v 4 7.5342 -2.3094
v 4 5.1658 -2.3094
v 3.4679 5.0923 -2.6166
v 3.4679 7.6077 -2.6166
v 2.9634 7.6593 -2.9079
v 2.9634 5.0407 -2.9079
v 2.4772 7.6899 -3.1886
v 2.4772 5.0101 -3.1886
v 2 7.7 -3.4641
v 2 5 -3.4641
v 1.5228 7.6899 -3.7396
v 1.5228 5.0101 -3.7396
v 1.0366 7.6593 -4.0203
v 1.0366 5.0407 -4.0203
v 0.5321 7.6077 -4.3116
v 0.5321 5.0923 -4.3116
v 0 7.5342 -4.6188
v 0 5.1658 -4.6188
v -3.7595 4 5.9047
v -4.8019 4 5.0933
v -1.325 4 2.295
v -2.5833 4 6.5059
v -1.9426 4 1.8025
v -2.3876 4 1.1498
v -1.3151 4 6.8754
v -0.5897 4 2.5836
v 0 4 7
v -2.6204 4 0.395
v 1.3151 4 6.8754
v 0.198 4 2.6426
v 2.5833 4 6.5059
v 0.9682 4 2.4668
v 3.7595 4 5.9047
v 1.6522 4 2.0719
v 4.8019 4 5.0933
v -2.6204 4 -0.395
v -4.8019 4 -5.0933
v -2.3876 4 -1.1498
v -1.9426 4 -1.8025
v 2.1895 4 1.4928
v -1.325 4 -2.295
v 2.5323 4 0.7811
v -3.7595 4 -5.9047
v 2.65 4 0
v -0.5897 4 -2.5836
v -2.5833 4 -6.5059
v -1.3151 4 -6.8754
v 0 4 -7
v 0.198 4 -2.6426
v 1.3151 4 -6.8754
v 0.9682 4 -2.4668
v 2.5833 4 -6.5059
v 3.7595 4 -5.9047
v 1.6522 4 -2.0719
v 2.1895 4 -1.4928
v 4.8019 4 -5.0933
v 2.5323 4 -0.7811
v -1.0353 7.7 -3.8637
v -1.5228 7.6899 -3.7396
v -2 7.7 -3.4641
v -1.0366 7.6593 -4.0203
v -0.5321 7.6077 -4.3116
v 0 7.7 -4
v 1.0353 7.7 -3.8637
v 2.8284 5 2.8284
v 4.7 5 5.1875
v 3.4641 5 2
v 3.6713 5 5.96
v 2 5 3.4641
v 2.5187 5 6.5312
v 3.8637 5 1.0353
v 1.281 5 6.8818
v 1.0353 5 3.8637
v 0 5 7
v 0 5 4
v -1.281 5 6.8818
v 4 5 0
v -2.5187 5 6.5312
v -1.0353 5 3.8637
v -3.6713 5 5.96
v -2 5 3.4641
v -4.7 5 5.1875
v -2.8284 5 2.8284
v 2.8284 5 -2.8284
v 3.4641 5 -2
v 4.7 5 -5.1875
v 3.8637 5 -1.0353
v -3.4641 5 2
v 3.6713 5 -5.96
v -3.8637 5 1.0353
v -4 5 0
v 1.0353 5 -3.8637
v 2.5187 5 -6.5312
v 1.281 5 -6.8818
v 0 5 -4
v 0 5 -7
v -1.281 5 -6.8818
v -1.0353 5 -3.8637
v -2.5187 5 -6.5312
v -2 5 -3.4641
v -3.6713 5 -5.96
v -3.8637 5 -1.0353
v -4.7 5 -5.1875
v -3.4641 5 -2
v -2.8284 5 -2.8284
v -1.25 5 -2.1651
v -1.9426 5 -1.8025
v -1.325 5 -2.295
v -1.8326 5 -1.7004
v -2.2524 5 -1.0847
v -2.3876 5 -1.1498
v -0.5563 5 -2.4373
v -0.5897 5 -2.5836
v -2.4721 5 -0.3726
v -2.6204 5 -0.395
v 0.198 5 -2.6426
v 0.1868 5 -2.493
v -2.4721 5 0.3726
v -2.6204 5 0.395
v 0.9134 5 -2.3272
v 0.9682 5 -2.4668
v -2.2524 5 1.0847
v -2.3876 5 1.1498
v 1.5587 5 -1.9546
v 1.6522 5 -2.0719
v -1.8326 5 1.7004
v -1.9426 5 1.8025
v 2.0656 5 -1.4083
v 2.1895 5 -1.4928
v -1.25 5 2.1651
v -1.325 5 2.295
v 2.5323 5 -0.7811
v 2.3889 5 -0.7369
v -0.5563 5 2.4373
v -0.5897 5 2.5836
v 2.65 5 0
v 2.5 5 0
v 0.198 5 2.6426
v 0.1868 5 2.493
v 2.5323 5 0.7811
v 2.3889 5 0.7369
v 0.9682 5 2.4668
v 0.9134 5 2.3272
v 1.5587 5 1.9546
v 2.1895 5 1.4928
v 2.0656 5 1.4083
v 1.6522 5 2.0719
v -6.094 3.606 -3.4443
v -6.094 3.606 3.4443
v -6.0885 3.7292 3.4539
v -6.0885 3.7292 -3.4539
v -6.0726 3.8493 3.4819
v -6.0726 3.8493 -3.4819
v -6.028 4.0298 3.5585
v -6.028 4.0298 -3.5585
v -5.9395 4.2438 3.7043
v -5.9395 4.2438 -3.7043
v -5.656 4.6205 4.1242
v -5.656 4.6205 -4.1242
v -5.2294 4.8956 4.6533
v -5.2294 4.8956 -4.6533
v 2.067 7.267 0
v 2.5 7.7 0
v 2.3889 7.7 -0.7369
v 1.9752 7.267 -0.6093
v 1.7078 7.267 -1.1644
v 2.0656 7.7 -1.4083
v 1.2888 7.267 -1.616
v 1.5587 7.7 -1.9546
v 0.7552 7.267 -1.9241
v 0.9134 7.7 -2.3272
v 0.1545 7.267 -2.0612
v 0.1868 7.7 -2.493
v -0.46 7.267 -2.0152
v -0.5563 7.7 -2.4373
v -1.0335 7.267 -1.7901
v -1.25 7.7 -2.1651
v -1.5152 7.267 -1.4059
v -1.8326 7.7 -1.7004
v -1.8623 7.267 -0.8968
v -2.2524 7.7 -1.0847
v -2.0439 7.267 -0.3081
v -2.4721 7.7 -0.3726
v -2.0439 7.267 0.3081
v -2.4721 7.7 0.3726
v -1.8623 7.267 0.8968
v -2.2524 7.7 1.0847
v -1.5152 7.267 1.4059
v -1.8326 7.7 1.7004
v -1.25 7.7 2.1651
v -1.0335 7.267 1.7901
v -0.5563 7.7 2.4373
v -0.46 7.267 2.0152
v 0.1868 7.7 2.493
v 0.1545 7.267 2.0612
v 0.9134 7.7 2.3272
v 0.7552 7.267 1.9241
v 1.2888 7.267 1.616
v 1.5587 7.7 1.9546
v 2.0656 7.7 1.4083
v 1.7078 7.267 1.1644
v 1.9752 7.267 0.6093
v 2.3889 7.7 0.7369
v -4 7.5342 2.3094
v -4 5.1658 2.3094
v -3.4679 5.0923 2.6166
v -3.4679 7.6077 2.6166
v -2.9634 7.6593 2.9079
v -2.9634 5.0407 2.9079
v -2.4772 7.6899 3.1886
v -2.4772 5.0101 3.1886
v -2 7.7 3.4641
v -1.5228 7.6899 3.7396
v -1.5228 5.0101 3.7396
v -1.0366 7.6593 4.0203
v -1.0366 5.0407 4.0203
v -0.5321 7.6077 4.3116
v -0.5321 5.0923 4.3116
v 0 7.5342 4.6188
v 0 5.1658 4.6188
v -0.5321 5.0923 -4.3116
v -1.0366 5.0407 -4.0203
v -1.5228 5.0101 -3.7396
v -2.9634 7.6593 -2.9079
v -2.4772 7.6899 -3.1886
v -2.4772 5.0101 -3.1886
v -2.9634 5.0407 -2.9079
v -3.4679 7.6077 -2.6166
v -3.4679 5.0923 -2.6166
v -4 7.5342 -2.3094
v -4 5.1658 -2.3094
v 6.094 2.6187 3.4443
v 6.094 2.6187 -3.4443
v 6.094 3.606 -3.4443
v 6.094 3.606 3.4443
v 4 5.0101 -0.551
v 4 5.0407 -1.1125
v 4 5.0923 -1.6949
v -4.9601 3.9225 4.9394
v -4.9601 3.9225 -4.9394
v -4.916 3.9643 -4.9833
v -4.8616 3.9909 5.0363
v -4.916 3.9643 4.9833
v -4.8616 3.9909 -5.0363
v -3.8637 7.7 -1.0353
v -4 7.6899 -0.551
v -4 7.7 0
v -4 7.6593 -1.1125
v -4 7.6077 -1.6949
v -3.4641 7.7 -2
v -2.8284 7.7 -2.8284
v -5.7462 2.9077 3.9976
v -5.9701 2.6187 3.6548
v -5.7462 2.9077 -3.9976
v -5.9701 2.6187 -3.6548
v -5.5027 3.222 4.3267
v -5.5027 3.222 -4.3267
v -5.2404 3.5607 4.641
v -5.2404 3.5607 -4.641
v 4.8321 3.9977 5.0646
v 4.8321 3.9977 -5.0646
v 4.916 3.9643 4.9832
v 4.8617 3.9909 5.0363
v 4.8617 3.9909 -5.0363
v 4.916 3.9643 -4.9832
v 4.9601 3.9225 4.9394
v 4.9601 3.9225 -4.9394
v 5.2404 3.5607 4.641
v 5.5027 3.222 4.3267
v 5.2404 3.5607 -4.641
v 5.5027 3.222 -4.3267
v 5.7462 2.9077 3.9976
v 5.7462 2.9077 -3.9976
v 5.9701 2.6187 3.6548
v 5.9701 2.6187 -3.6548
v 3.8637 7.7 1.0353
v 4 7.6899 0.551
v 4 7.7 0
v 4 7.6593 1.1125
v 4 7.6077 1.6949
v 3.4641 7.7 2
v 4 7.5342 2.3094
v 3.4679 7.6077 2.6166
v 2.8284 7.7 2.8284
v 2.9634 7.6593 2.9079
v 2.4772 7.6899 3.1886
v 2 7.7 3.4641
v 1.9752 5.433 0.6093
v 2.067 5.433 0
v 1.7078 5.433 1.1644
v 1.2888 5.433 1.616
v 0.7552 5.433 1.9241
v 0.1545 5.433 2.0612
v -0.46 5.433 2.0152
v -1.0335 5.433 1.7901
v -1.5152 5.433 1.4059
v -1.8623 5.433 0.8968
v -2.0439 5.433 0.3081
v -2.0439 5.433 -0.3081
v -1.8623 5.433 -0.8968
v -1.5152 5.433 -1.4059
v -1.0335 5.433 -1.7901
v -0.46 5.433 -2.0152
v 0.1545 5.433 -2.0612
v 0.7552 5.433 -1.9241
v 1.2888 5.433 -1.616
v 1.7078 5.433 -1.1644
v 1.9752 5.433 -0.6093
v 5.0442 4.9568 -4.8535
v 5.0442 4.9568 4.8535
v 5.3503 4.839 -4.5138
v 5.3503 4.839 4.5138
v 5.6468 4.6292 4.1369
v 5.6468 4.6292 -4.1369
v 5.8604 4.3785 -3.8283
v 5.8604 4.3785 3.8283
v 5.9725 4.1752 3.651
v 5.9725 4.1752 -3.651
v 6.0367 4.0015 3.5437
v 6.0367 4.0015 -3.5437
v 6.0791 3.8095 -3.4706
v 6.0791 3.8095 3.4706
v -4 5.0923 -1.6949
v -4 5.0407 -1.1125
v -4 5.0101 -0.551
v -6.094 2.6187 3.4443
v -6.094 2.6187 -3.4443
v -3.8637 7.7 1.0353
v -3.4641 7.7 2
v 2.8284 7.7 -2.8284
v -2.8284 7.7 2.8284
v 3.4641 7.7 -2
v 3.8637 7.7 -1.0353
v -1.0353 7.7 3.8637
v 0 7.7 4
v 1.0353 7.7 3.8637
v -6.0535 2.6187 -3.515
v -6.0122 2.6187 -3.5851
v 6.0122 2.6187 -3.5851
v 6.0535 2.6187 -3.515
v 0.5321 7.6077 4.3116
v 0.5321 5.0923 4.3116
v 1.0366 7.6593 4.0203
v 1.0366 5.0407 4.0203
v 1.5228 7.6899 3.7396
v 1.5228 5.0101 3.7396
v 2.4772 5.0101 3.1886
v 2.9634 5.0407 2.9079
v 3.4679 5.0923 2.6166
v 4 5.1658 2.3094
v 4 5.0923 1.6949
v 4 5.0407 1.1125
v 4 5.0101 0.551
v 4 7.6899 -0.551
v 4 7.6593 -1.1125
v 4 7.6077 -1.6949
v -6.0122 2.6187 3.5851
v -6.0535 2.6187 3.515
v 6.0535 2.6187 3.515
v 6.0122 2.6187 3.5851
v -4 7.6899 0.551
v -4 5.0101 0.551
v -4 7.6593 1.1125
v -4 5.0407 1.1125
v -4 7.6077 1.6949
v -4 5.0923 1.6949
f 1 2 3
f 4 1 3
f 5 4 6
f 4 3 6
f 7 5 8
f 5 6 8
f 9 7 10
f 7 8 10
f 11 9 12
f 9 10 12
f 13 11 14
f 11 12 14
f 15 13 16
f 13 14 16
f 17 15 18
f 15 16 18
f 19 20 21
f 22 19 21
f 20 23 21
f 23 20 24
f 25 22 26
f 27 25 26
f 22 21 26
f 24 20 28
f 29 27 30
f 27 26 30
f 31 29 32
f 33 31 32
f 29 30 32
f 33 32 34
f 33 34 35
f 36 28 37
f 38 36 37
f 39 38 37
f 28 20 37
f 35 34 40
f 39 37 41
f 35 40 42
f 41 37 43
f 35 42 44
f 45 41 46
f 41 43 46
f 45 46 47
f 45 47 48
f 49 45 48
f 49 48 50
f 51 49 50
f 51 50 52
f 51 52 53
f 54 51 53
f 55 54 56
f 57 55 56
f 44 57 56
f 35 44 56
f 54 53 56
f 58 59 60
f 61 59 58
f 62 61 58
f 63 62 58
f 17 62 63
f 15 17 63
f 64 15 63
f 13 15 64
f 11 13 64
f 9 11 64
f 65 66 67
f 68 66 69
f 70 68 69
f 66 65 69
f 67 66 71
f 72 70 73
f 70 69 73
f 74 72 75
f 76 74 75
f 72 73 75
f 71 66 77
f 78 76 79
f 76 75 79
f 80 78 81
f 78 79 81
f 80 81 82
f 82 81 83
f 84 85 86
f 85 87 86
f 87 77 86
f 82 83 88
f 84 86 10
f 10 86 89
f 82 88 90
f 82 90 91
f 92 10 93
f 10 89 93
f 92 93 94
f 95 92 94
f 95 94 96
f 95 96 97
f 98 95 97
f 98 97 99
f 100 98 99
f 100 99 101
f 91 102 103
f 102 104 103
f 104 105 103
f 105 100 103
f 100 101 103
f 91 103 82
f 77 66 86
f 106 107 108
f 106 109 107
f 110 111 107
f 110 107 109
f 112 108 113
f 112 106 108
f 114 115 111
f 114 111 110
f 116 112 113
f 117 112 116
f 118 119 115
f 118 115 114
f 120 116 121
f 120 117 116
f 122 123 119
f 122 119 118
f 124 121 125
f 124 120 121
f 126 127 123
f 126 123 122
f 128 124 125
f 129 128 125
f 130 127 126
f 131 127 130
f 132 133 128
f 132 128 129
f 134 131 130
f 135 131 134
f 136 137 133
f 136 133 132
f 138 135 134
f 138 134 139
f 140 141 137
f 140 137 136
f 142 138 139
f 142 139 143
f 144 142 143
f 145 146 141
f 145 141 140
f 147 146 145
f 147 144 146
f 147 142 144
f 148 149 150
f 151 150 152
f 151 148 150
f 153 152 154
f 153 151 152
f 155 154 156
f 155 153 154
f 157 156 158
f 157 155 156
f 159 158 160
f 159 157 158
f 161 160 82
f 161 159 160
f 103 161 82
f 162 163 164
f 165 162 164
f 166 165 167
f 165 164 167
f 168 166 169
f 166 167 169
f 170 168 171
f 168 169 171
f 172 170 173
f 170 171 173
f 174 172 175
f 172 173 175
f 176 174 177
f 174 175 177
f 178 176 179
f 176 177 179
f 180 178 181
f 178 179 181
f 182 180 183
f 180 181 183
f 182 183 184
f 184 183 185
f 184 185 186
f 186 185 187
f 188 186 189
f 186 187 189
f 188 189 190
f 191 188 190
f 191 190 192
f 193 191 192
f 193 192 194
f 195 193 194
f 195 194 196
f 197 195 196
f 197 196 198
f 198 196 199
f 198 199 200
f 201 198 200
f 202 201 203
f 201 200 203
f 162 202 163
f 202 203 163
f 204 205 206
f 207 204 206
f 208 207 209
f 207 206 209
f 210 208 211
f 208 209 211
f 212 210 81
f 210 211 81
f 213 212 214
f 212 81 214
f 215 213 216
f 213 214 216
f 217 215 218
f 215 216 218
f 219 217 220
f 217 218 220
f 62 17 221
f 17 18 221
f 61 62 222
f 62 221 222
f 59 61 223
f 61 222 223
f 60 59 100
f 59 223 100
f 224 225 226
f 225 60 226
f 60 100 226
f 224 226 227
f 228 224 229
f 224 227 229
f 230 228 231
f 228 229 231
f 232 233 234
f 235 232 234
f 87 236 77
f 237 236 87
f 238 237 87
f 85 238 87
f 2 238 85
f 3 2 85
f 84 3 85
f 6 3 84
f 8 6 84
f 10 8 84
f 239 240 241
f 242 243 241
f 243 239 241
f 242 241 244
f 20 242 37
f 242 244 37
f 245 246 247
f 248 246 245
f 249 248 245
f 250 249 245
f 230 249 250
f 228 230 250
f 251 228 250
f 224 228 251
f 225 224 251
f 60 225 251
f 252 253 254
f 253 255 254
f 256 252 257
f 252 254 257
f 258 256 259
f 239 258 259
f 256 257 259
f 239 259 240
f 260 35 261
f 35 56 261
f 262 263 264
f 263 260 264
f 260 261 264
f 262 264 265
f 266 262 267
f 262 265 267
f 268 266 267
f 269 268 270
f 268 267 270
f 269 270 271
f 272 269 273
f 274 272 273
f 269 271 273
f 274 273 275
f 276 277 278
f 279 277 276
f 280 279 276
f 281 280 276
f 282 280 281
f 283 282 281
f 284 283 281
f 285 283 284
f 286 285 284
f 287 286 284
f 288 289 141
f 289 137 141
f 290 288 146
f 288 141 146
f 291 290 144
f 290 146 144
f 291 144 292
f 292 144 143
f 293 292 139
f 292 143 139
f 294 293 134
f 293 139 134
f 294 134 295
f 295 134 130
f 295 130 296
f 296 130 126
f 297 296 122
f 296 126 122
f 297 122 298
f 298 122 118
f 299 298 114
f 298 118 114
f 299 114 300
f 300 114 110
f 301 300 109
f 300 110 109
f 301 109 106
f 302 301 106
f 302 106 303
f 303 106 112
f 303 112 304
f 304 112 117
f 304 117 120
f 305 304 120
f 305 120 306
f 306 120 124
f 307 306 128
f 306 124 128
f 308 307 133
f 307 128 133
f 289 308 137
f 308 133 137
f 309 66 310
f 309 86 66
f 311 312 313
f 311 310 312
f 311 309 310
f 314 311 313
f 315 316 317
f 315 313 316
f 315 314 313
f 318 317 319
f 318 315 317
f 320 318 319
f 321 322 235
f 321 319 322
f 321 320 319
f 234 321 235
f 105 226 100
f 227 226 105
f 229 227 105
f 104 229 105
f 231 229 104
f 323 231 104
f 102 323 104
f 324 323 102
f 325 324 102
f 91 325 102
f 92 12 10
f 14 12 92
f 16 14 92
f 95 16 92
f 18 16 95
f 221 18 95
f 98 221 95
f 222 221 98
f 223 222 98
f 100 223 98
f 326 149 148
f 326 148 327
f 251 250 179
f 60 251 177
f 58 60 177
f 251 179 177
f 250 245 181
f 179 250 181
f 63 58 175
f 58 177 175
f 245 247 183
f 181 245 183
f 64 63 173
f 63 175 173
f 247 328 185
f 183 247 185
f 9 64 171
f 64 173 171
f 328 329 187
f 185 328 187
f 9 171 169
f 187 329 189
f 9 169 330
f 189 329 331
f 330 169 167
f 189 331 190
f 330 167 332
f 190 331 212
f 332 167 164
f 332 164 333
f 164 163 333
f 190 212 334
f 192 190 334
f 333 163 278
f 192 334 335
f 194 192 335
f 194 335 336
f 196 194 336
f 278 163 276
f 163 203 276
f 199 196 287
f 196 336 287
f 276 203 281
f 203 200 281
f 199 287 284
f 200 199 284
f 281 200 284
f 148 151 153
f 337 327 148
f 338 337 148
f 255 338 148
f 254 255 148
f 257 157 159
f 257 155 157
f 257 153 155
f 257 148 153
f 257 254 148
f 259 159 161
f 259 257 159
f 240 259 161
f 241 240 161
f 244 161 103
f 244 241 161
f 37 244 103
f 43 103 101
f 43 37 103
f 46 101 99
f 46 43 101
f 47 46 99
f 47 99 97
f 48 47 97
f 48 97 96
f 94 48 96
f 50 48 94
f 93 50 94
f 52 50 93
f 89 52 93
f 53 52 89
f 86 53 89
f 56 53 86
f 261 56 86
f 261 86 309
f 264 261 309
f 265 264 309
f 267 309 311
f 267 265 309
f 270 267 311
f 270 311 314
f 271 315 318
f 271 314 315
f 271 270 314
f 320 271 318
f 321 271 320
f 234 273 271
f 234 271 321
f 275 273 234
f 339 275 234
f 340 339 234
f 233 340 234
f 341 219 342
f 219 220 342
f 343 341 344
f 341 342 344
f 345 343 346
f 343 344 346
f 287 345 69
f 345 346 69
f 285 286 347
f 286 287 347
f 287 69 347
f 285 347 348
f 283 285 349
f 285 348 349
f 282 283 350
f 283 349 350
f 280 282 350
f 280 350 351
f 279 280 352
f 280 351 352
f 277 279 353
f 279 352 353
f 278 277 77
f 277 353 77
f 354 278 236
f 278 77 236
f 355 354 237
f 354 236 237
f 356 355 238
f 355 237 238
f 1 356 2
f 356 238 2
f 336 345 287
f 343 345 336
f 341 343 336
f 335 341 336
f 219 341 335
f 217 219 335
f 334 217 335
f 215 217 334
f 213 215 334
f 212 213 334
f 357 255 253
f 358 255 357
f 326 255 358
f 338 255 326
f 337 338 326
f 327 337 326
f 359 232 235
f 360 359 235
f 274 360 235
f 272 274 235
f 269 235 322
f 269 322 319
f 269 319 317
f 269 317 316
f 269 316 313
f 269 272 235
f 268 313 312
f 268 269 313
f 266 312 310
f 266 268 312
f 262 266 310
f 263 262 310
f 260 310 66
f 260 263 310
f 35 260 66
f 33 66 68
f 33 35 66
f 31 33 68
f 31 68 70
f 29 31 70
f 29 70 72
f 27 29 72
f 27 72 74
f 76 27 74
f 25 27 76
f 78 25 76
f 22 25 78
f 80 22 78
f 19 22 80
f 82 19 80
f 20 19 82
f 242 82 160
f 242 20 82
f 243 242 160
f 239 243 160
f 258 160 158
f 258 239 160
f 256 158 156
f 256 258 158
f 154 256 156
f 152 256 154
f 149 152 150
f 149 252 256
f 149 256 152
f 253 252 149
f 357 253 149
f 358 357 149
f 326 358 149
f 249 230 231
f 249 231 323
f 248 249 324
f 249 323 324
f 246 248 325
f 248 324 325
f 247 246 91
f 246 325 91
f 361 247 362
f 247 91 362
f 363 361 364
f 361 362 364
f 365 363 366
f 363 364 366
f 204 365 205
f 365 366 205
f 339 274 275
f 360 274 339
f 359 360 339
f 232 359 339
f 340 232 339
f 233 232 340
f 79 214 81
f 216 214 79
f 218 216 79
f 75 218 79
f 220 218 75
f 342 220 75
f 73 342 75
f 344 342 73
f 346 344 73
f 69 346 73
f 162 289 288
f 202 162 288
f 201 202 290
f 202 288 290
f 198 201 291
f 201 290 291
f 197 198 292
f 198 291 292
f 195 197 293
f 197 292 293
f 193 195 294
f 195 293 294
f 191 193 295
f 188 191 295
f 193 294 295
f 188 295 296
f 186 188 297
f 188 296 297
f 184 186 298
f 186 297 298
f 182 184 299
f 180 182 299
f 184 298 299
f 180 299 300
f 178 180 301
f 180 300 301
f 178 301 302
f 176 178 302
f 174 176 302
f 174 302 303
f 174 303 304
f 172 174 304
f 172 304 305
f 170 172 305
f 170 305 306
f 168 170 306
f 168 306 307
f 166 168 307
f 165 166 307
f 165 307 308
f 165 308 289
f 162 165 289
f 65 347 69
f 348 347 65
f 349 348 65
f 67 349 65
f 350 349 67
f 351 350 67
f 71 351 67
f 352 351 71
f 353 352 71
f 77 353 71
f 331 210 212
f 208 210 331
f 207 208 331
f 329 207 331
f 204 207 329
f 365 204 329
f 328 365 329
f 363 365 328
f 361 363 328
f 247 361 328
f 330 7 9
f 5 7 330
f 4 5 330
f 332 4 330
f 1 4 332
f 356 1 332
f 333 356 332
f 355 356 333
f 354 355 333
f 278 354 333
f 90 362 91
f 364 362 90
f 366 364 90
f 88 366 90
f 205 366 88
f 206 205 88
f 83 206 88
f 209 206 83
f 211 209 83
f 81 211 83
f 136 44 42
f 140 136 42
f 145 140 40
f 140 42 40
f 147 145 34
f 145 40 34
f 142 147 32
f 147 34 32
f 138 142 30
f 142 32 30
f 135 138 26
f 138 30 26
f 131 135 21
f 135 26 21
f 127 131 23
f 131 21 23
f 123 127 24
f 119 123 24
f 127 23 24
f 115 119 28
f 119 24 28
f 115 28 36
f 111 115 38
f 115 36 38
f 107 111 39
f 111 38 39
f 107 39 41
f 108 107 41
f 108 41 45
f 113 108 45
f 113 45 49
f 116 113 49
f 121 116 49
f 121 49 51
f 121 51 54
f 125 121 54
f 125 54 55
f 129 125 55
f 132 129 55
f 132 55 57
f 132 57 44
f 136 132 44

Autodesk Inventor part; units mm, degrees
sketch "Skizze_1" plane through (0, 0, 0) normal (0, 0, 1) x (1, 0, 0)
  line L0 (-6.094, 2.6187) -> (-5.9701, 2.6187)
  line L1 (-5.9701, 2.6187) -> (-4.9601, 3.9225)
  arc A0 (-4.8019, 4) -> (-4.9601, 3.9225) centre (-4.8019, 3.8) ccw
  line L2 (-4.8019, 4) -> (4.8019, 4)
  arc A1 (4.9601, 3.9225) -> (4.8019, 4) centre (4.8019, 3.8) ccw
  line L3 (4.9601, 3.9225) -> (5.9701, 2.6187)
  line L4 (5.9701, 2.6187) -> (6.094, 2.6187)
  line L5 (6.094, 2.6187) -> (6.094, 3.606)
  arc A2 (6.094, 3.606) -> (4.7, 5) centre (4.7, 3.606) ccw
  line L6 (4.7, 5) -> (-4.7, 5)
  arc A3 (-4.7, 5) -> (-6.094, 3.606) centre (-4.7, 3.606) ccw
  line L7 (-6.094, 3.606) -> (-6.094, 2.6187)
extrude "Extrusion1" add sketch "Skizze_1" along normal mid plane 14
sketch "Skizze_2" plane through (0, 0, 0) normal (0, 0, 1) x (1, 0, 0)
  line L0 (0, 5) -> (0, 7.7)
  line L1 (0, 7.7) -> (4, 7.7)
  line L2 (4, 7.7) -> (4.8, 7.4856)
  line L3 (4.8, 7.4856) -> (4.8, 5.2144)
  line L4 (4.8, 5.2144) -> (4, 5)
  line L5 (4, 5) -> (0, 5)
  line L6 (0, 5) -> (0, 7.7)
revolve "Revolution1" add sketch "Skizze_2" angle 360 about axis through (0, 5, 0) along (0, -1, 0)
sketch "Skizze_3" plane through (0, 5, 0) normal (0, 1, 0) x (1, 0, 0)
  line L0 (-20, -18) -> (19, -18)
  line L1 (19, -18) -> (19, 12)
  line L2 (19, 12) -> (-20, 12)
  line L3 (-20, 12) -> (-20, -18)
  line L4 (-4, -2.3094) -> (0, -4.6188)
  line L5 (0, -4.6188) -> (4, -2.3094)
  line L6 (4, -2.3094) -> (4, 2.3094)
  line L7 (4, 2.3094) -> (0, 4.6188)
  line L8 (0, 4.6188) -> (-4, 2.3094)
  line L9 (-4, 2.3094) -> (-4, -2.3094)
extrude "Extrusion2" cut sketch "Skizze_3" along normal blind 2.7
sketch "Skizze_4" plane through (0, 0, 0) normal (0, 1, 0) x (-1, 0, 0)
  line L0 (23, 26) -> (-35, 26)
  line L1 (-35, 26) -> (-35, -16)
  line L2 (-35, -16) -> (23, -16)
  line L3 (23, -16) -> (23, 26)
  circle A0 centre (0, 0) radius 7
extrude "Extrusion3" cut sketch "Skizze_4" along normal blind 10
sketch "Skizze_5_ALT_Drilling_1" plane through (0, 0, 0) normal (0, 0, 1) x (1, 0, 0)
  line L0 (0, 4) -> (0, 7.7)
  line L1 (0, 7.7) -> (2.5, 7.7)
  line L2 (2.5, 7.7) -> (2.067, 7.267)
  line L3 (2.067, 7.267) -> (2.067, 5.433)
  line L4 (2.067, 5.433) -> (2.5, 5)
  line L5 (2.5, 5) -> (2.65, 5)
  line L6 (2.65, 5) -> (2.65, 4)
  line L7 (2.65, 4) -> (0, 4)
  line L8 (0, 4) -> (0, 7.7)
revolve "Revolution2" cut sketch "Skizze_5_ALT_Drilling_1" angle 360 about axis through (0, 4, 0) along (0, -1, 0)
thread "Thread1" size "M5x0.8" class "6H" standard "ISO Metric profile" full length
ref_plane "FS1_XY" through (0, 0, 0) normal (0, 1, 0) x (1, 0, 0)
ref_plane "FS1_YZ" through (0, 0, 0) normal (1, 0, 0) x (0, 0, -1)
ref_plane "FS1_ZX" through (0, 0, 0) normal (0, 0, -1) x (0, 1, 0)
ref_plane "FS2_XY" through (0, 0, 0) normal (0, 0, 1) x (1, 0, 0)
ref_plane "FS2_YZ" through (0, 0, 0) normal (1, 0, 0) x (0, 1, 0)
ref_plane "FS2_ZX" through (0, 0, 0) normal (0, 1, 0) x (0, 0, 1)
properties part number "102111-M-KOMP"
